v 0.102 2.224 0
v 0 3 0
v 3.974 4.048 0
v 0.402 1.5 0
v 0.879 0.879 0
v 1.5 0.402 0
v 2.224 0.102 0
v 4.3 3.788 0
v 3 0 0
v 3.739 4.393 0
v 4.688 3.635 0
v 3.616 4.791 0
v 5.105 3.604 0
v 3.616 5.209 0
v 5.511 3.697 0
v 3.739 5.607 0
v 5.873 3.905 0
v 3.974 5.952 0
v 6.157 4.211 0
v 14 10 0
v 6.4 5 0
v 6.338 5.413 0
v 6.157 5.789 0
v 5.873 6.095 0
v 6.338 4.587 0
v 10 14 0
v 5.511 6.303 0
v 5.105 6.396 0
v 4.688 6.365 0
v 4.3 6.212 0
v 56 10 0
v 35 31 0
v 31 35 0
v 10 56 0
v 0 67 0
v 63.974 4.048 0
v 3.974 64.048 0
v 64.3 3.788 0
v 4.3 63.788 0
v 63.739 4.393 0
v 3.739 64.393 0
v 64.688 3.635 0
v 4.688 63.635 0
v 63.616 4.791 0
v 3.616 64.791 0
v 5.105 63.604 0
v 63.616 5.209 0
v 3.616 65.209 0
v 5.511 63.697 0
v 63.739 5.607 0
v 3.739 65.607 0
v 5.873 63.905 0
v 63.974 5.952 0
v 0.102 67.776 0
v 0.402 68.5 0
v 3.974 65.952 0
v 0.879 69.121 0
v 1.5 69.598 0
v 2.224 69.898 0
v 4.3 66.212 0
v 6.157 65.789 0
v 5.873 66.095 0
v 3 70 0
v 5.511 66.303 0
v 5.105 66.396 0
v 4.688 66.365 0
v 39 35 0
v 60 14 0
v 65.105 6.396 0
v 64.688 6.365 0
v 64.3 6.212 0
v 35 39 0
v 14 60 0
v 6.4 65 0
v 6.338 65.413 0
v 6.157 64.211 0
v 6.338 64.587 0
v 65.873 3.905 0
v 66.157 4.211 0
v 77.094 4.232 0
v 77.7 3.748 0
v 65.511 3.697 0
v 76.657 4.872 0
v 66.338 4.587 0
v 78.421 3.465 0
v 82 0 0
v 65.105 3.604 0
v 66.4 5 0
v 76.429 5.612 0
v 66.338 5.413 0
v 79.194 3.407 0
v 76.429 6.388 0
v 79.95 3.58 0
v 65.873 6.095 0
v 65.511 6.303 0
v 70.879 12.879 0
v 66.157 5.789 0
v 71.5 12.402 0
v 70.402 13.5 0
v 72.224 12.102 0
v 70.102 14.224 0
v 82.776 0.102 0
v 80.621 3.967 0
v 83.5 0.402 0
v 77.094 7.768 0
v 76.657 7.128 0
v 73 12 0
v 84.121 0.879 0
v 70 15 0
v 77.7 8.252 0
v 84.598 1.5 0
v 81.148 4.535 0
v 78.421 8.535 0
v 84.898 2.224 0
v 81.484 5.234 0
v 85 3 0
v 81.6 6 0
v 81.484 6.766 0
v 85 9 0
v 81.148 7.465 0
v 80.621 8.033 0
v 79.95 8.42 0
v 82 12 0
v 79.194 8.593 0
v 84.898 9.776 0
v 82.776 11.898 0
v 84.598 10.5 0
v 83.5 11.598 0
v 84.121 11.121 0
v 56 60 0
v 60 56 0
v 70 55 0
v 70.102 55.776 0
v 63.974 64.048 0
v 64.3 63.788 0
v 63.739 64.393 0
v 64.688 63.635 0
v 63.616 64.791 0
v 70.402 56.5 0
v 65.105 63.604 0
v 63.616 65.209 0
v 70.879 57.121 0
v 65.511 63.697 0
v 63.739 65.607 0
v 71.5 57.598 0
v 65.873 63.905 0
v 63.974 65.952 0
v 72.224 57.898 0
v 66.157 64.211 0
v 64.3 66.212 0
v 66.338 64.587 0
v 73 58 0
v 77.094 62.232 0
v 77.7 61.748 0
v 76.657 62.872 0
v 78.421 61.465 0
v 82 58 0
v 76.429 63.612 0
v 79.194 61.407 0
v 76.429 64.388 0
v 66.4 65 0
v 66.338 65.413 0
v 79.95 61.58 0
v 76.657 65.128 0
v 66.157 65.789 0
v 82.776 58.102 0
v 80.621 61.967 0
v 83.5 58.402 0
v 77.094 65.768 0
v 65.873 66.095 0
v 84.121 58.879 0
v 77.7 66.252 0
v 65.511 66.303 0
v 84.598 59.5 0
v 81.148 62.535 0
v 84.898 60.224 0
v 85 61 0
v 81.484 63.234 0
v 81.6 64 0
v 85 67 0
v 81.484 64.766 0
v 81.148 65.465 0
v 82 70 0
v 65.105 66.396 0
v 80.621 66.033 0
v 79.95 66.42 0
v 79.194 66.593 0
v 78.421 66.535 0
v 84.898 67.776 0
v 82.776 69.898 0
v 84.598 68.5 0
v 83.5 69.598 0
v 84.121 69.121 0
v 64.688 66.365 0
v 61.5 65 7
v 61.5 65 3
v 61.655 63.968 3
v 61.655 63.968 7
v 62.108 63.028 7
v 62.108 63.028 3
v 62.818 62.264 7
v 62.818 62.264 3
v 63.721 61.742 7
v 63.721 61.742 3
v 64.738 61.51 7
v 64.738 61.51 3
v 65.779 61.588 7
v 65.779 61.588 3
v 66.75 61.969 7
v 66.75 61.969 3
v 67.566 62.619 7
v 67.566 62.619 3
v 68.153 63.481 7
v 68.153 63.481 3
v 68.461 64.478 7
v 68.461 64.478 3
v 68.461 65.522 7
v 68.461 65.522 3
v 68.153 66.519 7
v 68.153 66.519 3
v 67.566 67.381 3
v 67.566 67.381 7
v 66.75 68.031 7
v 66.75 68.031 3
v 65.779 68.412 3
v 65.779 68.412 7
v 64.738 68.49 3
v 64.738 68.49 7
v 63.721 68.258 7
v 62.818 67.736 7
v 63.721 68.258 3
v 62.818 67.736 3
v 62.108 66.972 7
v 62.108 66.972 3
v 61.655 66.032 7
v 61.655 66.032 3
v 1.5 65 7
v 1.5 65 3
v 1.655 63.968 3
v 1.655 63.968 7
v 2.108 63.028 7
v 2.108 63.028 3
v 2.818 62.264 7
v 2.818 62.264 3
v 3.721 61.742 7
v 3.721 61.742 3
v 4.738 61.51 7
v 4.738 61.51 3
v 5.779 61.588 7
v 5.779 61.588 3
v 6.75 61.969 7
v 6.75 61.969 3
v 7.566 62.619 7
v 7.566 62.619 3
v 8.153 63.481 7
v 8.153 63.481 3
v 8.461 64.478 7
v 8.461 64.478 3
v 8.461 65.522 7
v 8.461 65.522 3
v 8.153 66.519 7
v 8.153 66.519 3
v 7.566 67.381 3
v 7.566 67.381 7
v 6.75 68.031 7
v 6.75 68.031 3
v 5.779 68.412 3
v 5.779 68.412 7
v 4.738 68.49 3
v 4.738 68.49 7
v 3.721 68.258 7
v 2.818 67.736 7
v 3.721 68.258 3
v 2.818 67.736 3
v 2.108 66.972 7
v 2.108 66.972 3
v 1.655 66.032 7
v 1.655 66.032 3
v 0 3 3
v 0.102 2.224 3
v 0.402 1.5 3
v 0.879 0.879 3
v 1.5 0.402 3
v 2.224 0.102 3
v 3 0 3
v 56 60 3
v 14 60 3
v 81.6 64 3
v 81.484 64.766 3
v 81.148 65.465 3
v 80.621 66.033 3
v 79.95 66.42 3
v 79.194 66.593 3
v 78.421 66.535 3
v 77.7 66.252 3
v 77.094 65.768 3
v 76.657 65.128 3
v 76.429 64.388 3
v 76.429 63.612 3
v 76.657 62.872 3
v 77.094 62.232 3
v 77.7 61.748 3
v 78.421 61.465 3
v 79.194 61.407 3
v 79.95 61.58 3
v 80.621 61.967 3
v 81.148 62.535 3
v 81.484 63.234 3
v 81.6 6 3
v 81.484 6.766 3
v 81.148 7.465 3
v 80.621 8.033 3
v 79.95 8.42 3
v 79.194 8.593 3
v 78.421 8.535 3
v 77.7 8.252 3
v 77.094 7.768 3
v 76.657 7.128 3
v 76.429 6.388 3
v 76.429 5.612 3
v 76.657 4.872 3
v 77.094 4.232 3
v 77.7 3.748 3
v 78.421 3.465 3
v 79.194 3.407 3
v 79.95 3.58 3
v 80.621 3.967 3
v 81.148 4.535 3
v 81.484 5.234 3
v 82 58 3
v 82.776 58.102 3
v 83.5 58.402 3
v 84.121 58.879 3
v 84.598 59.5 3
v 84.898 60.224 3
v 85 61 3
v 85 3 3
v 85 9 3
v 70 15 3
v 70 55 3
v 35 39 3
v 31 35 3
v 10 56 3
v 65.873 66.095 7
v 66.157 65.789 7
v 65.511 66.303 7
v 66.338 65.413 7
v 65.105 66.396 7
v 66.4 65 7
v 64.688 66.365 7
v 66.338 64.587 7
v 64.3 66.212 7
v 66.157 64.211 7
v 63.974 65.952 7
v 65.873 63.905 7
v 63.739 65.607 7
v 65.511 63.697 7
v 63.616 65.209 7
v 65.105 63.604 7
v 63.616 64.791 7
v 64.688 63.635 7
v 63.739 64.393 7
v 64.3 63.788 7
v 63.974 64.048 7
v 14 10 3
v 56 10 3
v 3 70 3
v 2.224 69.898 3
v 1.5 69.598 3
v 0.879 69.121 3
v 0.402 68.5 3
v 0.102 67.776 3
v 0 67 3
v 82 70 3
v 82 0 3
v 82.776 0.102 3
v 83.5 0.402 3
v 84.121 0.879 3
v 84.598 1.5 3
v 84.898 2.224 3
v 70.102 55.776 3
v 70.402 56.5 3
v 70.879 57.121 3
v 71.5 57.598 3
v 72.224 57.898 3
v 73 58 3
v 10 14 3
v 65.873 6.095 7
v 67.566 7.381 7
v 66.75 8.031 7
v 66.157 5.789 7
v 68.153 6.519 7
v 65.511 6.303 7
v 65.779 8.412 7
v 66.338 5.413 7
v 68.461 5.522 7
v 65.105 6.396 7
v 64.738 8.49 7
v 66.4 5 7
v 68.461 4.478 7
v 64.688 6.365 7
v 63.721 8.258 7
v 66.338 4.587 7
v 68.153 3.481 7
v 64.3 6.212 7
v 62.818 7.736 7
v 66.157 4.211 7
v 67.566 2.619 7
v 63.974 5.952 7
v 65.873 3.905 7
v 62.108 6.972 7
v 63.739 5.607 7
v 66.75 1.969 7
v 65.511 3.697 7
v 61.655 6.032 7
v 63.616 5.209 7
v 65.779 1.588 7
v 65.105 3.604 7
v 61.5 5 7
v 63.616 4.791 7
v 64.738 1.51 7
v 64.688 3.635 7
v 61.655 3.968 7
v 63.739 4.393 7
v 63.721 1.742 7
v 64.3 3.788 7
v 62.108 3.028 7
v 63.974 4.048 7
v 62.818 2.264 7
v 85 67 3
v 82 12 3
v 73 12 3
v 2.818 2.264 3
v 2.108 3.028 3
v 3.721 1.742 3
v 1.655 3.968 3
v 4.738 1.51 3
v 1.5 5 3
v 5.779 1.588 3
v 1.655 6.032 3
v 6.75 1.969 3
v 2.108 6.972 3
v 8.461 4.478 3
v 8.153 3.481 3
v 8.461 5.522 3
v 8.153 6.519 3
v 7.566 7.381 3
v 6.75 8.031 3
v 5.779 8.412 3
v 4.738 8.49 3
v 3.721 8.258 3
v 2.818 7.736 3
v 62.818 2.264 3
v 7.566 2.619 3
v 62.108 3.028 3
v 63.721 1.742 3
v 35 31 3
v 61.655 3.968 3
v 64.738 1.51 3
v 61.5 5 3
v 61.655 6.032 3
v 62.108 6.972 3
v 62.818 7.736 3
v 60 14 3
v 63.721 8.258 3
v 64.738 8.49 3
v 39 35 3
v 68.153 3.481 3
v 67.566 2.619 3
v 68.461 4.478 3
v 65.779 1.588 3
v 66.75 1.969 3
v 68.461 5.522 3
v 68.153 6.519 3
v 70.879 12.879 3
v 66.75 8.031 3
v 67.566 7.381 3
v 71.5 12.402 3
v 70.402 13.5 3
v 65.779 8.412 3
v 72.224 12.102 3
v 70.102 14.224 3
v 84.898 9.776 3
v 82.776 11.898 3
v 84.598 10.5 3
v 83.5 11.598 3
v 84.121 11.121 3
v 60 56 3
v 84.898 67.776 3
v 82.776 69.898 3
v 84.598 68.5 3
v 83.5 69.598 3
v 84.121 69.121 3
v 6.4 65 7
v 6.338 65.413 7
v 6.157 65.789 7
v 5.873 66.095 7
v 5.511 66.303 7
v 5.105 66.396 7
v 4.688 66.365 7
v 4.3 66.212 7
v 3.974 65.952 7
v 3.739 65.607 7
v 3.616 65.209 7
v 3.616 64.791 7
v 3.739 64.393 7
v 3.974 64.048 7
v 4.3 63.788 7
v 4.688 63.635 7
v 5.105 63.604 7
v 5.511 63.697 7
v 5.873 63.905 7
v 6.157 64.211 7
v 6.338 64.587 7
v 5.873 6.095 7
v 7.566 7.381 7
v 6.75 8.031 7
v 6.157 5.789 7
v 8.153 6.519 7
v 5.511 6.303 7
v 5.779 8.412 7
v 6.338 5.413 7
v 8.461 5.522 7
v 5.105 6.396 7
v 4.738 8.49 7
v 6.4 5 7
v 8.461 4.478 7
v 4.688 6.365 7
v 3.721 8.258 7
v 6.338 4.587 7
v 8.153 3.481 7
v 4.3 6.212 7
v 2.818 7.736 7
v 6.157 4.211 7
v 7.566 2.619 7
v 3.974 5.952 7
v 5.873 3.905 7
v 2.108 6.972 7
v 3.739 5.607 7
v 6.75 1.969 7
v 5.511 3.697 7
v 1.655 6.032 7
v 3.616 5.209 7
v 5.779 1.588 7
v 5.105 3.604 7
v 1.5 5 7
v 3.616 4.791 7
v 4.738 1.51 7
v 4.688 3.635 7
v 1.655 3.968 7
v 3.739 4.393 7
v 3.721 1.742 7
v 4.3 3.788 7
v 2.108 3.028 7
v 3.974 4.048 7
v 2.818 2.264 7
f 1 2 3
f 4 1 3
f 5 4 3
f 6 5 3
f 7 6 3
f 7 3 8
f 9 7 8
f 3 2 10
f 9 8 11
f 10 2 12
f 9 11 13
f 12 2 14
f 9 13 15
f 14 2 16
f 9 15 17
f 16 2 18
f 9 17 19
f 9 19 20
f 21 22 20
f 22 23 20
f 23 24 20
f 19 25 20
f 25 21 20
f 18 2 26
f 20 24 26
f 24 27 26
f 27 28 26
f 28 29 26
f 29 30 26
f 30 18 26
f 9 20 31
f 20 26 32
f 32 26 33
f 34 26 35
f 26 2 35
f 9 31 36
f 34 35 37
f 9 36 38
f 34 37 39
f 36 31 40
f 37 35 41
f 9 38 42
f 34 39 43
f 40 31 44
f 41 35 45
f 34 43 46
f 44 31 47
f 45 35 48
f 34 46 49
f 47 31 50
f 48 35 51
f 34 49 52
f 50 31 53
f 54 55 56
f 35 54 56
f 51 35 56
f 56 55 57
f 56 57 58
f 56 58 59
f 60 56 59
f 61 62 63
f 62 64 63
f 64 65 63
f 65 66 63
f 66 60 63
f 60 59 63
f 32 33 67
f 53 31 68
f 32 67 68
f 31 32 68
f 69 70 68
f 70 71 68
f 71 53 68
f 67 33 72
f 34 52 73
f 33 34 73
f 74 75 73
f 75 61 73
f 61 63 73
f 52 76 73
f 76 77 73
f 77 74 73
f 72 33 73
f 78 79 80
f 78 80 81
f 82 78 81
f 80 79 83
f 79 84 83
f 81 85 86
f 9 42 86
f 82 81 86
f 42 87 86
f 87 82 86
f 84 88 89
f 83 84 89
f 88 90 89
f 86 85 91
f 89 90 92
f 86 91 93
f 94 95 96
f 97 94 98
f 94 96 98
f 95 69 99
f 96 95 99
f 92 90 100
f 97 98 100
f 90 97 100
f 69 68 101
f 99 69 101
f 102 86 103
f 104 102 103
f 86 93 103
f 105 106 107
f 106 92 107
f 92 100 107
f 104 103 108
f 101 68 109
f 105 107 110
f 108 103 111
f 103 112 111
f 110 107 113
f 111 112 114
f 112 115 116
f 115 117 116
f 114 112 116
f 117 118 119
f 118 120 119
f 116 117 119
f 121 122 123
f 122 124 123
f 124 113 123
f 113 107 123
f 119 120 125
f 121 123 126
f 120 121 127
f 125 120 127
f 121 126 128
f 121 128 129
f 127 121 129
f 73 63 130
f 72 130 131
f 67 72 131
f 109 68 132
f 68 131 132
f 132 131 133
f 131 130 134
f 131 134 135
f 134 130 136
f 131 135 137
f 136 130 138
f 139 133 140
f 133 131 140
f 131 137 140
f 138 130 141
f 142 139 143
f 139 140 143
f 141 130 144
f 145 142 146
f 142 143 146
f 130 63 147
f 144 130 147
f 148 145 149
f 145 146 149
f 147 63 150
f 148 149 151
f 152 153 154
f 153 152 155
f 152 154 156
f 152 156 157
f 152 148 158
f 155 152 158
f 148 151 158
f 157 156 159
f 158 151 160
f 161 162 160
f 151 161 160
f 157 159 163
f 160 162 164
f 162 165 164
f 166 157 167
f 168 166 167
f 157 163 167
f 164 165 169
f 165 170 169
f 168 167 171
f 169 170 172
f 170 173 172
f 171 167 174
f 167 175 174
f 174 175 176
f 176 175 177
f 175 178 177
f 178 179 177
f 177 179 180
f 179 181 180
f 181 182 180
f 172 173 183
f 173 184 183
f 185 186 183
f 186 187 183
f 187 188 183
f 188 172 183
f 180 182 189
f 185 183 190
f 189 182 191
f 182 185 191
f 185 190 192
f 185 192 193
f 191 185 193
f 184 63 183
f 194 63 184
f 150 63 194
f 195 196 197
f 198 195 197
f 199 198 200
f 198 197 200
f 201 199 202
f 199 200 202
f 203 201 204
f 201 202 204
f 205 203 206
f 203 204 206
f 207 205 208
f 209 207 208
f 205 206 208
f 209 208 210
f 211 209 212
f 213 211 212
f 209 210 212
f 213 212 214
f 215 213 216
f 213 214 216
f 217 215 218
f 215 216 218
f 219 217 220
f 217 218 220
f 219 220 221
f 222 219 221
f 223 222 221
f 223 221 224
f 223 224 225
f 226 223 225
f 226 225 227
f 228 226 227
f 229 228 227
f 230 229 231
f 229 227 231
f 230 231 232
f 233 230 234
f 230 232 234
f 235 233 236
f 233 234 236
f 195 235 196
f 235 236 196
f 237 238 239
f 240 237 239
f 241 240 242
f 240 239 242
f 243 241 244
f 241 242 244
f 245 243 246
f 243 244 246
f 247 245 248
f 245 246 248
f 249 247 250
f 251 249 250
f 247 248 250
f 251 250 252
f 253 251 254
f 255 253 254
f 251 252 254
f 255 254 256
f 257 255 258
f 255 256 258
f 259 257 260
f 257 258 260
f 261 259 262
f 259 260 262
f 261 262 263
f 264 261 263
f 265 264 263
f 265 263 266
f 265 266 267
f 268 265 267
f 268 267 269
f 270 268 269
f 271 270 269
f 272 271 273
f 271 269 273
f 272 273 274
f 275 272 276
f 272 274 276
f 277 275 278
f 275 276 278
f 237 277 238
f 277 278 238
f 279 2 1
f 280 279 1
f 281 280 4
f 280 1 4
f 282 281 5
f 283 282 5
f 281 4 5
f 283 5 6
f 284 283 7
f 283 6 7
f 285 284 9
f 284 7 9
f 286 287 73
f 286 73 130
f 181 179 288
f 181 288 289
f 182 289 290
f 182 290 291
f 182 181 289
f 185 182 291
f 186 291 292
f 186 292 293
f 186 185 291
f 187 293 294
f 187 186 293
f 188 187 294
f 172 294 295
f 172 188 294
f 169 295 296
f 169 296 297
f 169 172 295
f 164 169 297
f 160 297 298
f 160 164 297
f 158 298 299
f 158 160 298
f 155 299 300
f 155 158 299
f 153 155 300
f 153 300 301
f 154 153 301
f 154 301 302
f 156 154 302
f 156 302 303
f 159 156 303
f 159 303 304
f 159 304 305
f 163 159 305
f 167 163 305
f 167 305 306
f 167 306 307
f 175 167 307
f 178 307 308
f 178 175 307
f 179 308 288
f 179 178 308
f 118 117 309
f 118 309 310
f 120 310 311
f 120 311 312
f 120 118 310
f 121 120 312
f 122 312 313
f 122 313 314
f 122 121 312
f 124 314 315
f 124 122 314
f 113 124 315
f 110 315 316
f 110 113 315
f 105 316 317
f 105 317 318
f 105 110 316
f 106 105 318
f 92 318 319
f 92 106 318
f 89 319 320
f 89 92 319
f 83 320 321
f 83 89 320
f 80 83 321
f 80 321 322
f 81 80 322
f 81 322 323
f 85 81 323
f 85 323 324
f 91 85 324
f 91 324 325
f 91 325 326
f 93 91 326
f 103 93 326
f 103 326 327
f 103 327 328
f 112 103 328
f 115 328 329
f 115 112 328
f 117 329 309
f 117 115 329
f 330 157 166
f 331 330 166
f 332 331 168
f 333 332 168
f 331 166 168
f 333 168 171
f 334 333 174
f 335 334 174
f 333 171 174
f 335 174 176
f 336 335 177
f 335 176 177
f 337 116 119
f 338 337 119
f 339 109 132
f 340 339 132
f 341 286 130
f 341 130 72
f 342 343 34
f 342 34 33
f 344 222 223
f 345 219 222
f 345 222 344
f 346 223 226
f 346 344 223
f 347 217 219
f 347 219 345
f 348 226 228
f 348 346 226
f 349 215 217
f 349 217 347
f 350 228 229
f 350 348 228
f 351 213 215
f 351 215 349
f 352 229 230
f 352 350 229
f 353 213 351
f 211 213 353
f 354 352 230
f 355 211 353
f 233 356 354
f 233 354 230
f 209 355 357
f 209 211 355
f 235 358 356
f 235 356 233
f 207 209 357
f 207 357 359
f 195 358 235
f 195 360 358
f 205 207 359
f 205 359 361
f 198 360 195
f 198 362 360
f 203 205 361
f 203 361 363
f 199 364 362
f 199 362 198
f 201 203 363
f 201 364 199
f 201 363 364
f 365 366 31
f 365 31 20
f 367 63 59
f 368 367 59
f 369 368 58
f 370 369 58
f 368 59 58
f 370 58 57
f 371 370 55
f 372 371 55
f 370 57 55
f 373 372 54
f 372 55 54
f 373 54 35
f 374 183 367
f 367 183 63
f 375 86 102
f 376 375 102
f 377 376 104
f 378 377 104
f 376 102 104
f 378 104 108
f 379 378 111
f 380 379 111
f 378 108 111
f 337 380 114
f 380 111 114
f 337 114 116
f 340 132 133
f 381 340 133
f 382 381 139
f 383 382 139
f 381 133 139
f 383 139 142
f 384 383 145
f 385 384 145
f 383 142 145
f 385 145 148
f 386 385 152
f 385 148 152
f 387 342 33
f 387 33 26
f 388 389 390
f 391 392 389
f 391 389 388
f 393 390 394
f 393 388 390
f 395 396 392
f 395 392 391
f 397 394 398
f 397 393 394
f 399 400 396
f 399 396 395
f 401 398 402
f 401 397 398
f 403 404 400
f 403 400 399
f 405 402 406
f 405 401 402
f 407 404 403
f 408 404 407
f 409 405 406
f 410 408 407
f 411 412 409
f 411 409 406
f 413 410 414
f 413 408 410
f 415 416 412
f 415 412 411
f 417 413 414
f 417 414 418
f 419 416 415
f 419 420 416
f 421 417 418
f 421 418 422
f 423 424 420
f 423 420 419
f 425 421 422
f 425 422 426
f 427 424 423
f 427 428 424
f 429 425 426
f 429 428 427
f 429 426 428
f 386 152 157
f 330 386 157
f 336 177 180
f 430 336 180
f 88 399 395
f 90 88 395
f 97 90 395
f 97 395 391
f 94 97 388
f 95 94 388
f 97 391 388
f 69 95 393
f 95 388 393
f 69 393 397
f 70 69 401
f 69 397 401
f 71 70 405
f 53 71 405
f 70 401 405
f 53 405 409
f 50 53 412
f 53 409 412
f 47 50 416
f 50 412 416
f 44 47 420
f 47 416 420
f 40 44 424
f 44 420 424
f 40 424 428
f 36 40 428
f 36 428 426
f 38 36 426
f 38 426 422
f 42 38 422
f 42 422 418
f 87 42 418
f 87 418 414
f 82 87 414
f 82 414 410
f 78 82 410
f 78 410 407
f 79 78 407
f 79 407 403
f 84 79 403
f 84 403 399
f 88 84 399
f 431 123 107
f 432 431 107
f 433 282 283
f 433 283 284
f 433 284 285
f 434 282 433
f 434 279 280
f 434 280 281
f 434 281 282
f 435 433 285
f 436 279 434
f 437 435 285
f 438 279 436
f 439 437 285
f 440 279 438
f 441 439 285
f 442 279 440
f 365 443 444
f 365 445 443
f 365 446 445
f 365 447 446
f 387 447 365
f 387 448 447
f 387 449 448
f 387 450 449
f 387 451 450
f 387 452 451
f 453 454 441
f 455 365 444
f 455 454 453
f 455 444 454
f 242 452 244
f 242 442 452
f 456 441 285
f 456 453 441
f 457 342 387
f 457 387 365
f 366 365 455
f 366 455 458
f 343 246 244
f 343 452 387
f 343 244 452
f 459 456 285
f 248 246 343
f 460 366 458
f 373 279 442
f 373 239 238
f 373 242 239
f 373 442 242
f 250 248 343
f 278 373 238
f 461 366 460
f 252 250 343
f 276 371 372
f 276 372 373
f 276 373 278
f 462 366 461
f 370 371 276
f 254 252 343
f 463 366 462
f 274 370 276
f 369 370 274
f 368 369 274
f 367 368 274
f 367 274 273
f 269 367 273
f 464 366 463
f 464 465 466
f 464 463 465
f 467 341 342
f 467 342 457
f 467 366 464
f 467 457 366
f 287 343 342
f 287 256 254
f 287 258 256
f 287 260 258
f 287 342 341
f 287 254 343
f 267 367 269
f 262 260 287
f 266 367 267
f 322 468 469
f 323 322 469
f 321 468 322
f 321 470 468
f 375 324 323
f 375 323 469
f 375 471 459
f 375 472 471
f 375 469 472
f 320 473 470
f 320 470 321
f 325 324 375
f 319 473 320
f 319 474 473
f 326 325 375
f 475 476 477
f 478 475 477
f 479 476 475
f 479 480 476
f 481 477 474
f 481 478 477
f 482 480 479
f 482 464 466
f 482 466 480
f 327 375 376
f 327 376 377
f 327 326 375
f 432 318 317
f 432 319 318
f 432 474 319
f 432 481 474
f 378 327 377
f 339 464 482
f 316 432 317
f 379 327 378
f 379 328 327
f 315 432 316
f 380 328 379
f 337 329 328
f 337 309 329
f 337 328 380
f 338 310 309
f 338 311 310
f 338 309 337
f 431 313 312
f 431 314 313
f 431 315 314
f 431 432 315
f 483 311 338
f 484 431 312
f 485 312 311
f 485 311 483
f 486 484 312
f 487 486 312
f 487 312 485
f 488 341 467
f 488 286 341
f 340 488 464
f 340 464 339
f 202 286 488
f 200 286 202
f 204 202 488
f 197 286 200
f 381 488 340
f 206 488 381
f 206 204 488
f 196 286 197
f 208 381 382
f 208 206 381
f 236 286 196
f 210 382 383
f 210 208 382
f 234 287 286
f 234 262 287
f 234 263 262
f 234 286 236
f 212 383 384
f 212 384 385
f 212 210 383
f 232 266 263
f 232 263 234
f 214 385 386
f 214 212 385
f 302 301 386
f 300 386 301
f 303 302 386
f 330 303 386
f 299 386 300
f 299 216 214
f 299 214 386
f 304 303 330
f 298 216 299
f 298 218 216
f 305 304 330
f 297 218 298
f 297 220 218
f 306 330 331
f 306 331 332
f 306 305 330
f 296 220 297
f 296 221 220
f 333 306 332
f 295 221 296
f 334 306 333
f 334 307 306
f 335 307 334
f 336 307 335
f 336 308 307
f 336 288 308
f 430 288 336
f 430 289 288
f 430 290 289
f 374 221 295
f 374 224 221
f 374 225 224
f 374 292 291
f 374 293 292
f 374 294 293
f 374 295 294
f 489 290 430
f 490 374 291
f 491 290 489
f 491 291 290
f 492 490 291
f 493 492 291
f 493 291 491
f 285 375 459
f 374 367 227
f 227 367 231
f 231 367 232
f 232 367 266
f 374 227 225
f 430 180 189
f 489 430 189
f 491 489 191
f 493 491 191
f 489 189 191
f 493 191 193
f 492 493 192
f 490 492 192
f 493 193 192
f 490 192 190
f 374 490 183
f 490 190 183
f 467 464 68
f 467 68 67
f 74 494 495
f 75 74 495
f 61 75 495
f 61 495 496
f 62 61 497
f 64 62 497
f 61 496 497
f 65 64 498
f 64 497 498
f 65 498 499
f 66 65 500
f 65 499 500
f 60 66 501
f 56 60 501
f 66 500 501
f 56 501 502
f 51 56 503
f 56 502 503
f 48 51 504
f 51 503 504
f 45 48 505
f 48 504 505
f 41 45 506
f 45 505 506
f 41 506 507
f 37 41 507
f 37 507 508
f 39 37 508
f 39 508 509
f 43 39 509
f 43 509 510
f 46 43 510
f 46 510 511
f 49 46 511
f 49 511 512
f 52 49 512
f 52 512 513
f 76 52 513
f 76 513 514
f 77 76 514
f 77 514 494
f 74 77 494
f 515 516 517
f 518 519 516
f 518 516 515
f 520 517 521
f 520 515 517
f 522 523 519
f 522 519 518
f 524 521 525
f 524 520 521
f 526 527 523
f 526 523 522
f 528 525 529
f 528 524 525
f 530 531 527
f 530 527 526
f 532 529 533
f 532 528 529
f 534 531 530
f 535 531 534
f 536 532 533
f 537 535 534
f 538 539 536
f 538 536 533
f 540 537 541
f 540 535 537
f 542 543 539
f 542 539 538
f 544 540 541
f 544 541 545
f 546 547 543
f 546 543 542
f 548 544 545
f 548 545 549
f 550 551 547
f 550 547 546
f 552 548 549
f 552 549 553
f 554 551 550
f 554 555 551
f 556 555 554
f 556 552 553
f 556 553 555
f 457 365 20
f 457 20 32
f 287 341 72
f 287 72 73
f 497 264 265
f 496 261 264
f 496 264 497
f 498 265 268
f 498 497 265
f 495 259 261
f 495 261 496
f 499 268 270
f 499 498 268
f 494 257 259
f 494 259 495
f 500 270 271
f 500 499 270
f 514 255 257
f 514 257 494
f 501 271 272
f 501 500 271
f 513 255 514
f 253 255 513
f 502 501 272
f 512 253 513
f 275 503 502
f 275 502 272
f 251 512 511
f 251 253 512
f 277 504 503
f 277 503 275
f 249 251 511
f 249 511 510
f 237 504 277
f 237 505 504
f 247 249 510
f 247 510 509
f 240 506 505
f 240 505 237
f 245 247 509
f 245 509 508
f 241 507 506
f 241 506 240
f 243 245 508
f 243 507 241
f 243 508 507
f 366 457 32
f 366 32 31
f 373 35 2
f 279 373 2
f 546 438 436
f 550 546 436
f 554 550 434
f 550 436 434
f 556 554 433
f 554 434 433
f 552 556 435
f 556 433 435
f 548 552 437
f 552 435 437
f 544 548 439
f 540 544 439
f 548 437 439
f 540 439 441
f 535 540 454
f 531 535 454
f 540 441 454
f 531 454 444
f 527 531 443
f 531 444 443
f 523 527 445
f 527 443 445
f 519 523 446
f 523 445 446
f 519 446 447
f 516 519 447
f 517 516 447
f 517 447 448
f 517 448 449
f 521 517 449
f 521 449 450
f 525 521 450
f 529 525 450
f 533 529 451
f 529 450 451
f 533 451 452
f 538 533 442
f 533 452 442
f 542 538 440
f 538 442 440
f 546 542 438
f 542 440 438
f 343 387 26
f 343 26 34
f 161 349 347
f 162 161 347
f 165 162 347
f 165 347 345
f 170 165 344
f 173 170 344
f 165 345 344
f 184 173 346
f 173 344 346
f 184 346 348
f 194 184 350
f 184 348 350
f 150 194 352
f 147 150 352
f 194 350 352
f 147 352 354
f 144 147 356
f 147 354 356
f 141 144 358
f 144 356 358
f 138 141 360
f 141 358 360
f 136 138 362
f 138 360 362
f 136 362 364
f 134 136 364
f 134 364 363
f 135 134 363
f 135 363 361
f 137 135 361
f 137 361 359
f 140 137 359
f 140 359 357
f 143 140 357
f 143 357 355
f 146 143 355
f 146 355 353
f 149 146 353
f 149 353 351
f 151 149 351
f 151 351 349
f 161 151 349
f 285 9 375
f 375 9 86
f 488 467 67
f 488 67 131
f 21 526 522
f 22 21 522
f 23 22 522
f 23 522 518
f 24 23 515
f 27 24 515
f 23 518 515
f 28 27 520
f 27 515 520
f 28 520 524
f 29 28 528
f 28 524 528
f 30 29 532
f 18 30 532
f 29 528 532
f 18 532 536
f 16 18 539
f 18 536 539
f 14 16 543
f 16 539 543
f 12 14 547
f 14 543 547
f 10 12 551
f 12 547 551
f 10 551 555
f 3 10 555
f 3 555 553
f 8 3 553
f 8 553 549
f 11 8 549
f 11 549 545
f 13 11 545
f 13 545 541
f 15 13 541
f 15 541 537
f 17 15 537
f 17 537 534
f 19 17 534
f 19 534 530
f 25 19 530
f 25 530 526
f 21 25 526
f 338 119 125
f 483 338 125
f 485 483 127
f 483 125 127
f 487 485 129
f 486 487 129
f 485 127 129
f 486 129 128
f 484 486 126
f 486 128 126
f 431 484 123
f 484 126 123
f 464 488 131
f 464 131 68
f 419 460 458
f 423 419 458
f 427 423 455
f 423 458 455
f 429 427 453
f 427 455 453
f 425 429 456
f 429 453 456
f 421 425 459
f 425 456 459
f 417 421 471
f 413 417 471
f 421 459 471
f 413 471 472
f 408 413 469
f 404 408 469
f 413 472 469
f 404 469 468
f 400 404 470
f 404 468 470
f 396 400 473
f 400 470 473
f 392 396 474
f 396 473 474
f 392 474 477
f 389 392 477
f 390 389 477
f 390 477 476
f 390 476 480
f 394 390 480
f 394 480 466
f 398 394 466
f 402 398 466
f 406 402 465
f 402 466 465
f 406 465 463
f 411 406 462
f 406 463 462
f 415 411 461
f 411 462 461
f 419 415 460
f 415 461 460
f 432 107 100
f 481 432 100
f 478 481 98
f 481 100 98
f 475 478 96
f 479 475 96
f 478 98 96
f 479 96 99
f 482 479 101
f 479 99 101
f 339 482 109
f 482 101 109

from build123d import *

# Parameters (mm, degrees)
SKETCH1_R           = 2.6
BOSS_EXTRUDE1_DEPTH = 3
SKETCH2_R           = 3.5
BOSS_EXTRUDE2_DEPTH = 4
CUT_EXTRUDE1_DEPTH  = 3
SKETCH4_R           = 1.4
CUT_EXTRUDE2_DEPTH  = 111.335850928


with BuildPart() as part:
    # Sketch1 → Boss-Extrude1 (new body)
    with BuildSketch(Plane.XY):
        with BuildLine():
            Line((3, 0), (70, 0))
            Line((70, 0), (82, 0))
            ThreePointArc((82, 0), (84.121320344, 0.878679656), (85, 3))
            Line((85, 3), (85, 9))
            ThreePointArc((85, 9), (84.121320344, 11.121320344), (82, 12))
            Line((82, 12), (73, 12))
            ThreePointArc((73, 12), (70.878679656, 12.878679656), (70, 15))
            Line((70, 15), (70, 55))
            ThreePointArc((70, 55), (70.878679656, 57.121320344), (73, 58))
            Line((73, 58), (82, 58))
            ThreePointArc((82, 58), (84.121320344, 58.878679656), (85, 61))
            Line((85, 61), (85, 67))
            ThreePointArc((85, 67), (84.121320344, 69.121320344), (82, 70))
            Line((82, 70), (67, 70))
            Line((67, 70), (3, 70))
            ThreePointArc((3, 70), (0.878679656, 69.121320344), (0, 67))
            Line((0, 67), (0, 3))
            ThreePointArc((0, 3), (0.878679656, 0.878679656), (3, 0))
        make_face()
        with Locations((79, 64)):
            Circle(SKETCH1_R, mode=Mode.SUBTRACT)
        with Locations((79, 6)):
            Circle(SKETCH1_R, mode=Mode.SUBTRACT)
    extrude(amount=BOSS_EXTRUDE1_DEPTH)

    # Sketch2 → Boss-Extrude2 (add)
    with BuildSketch(Plane.XY.offset(3)):
        with Locations(Location((5, 65, 0), (0, 0, 180))):
            Circle(SKETCH2_R)
        with Locations(Location((65, 65, 0), (0, 0, 180))):
            Circle(SKETCH2_R)
        with Locations(Location((65, 5, 0), (0, 0, 180))):
            Circle(SKETCH2_R)
        with Locations(Location((5, 5, 0), (0, 0, 180))):
            Circle(SKETCH2_R)
    extrude(amount=BOSS_EXTRUDE2_DEPTH)

    # Sketch3 → Cut-Extrude1 (cut)
    with BuildSketch(Plane.XY.offset(3)):
        Polygon((14, 60), (56, 60), (35, 39), align=None)
        Polygon((60, 56), (60, 14), (39, 35), align=None)
        Polygon((56, 10), (14, 10), (35, 31), align=None)
        Polygon((10, 14), (10, 56), (31, 35), align=None)
    extrude(amount=-CUT_EXTRUDE1_DEPTH, mode=Mode.SUBTRACT)

    # Sketch4 → Cut-Extrude2 (cut, through all)
    with BuildSketch(Plane.XY.offset(7)):
        with Locations((5, 65)):
            Circle(SKETCH4_R)
        with Locations((65, 65)):
            Circle(SKETCH4_R)
        with Locations((65, 5)):
            Circle(SKETCH4_R)
        with Locations((5, 5)):
            Circle(SKETCH4_R)
    extrude(amount=-CUT_EXTRUDE2_DEPTH, mode=Mode.SUBTRACT)


solid = part.part
